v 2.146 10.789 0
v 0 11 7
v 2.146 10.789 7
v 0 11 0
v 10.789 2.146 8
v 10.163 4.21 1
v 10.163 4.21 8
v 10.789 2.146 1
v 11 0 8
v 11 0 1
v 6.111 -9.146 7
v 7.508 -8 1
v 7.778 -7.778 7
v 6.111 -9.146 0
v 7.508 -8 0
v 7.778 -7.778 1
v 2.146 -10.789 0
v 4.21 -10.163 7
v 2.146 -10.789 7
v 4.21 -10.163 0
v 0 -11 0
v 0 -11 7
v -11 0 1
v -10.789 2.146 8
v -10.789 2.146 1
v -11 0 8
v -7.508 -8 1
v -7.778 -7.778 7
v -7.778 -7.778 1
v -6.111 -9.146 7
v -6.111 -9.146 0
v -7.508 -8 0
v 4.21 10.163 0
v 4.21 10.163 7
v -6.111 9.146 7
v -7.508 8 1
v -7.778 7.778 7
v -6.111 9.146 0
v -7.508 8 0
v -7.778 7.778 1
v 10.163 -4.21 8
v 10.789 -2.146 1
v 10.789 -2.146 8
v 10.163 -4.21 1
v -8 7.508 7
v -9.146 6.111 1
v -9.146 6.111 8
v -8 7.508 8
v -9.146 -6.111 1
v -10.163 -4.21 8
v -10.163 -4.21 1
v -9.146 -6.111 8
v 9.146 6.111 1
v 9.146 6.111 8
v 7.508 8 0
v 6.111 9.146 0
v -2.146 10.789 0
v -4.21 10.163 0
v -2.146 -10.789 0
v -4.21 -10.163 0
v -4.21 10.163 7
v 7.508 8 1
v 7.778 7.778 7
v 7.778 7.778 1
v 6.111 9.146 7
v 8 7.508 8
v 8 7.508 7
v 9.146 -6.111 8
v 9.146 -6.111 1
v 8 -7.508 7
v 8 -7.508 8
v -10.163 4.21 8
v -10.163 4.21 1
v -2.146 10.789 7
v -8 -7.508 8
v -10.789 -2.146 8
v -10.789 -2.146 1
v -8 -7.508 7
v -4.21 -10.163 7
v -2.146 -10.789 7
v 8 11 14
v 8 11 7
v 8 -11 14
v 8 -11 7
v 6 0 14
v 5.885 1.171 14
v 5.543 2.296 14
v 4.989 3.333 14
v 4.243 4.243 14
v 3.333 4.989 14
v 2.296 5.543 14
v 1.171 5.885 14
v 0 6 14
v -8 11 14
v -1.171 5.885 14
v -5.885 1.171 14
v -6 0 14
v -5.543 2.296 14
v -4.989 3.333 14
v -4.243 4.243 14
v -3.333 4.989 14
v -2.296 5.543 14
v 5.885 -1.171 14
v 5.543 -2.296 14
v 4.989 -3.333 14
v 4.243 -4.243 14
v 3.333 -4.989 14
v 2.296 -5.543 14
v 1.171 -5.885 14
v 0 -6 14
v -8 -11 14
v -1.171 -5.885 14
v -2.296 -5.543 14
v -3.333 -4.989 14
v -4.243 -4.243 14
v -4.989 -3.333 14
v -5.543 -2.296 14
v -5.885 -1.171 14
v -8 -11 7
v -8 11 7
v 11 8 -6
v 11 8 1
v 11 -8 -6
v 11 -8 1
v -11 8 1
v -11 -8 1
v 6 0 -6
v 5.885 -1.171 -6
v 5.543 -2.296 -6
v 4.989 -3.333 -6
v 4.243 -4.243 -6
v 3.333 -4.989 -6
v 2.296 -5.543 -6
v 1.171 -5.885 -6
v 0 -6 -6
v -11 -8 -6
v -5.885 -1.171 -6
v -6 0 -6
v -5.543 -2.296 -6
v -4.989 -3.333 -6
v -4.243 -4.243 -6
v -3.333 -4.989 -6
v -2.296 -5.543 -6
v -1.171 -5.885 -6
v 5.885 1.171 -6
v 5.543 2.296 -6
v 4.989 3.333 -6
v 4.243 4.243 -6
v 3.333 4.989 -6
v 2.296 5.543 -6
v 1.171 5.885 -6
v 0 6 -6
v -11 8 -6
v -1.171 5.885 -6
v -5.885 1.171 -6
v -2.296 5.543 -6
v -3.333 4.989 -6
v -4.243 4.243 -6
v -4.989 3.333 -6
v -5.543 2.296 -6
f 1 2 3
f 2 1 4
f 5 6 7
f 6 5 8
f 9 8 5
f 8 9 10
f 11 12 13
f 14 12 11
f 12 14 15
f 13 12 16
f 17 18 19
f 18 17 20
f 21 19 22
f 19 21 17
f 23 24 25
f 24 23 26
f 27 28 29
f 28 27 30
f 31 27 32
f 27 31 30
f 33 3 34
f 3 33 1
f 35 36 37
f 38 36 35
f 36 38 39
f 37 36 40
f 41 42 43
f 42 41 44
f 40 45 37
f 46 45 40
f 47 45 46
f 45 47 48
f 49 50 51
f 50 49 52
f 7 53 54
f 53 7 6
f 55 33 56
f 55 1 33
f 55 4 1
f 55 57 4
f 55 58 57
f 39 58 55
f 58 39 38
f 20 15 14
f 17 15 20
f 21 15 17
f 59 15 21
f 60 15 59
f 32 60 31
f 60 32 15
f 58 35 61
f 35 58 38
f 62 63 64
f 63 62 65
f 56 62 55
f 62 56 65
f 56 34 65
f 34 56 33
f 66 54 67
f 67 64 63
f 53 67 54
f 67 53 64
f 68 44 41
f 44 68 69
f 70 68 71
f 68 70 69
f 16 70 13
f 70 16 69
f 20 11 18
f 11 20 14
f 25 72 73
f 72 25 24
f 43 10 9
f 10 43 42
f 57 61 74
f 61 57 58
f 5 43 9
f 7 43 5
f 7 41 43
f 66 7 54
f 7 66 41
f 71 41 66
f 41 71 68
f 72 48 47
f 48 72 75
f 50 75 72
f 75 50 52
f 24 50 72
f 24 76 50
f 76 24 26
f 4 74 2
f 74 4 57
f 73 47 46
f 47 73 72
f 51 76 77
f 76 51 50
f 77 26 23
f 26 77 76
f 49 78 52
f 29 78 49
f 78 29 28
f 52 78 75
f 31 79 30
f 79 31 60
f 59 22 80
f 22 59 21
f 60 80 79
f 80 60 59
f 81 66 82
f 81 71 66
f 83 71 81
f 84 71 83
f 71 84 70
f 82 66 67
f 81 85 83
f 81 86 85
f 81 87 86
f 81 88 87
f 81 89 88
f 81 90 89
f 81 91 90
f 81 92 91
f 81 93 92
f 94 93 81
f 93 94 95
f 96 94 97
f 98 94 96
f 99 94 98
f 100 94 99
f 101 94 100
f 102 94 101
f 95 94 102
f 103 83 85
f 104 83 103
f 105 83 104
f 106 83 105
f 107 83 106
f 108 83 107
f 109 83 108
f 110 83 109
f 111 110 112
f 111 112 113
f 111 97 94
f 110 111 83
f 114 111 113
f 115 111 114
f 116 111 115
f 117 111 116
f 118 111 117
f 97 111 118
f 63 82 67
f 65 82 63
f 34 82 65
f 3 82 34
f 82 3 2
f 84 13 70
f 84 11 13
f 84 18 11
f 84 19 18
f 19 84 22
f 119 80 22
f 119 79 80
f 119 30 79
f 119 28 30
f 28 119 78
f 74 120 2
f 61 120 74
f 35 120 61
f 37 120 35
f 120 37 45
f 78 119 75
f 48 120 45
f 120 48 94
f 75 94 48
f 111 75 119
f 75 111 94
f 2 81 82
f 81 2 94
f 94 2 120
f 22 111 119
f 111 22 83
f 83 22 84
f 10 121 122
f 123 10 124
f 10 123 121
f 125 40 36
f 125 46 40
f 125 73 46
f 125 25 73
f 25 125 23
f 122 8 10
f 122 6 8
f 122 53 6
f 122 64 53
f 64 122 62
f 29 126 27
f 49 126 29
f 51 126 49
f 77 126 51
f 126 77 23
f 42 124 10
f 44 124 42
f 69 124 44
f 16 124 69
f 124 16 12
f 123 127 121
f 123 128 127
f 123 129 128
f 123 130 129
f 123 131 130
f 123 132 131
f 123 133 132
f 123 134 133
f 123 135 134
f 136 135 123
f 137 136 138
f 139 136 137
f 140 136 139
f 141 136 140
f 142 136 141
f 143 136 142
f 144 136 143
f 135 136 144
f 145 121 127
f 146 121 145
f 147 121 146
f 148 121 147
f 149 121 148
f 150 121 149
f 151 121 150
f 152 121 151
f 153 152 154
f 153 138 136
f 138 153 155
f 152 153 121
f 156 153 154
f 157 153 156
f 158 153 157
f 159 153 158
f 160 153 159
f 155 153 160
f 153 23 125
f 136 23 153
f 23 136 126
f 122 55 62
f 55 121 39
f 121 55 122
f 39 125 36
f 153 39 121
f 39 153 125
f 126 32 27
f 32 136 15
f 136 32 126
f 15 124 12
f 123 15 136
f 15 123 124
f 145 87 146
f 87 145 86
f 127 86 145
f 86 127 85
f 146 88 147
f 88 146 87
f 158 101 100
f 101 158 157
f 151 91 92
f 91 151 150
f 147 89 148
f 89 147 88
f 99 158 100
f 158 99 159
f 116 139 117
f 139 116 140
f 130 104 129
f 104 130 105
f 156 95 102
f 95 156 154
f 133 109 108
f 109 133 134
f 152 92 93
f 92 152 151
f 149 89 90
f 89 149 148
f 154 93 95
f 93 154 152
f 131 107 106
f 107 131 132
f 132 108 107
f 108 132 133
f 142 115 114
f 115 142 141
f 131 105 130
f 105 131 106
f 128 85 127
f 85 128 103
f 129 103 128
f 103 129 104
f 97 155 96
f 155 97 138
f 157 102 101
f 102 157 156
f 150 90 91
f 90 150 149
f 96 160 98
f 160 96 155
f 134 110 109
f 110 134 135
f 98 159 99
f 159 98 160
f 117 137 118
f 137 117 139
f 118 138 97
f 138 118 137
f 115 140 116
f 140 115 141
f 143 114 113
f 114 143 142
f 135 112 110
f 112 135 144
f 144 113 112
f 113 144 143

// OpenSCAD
$fn = 32;

// ----------------------------------------------------------------------
// Oldham coupling disc: 22 x 20 mm
// ----------------------------------------------------------------------

// --- parameters (mm) ---
disc_d = 22;              // disc diameter
disc_t = 8;               // disc thickness
tongue_w = 16;            // tongue width
tongue_h = 6;             // tongue height
bore_d = 12;              // centre lightening bore

module disc() {
  cylinder(h = disc_t, d = disc_d);
  /* tongue on the top face, sunk 1 mm into the disc */
  translate([-tongue_w / 2, -disc_d / 2, disc_t - 1]) cube([tongue_w, disc_d, tongue_h + 1]);
  /* slot wall on the bottom face, 90 degrees turned */
  translate([-disc_d / 2, -tongue_w / 2, -tongue_h]) cube([disc_d, tongue_w, tongue_h + 1]);
}

difference() {
  disc();
  translate([0, 0, -tongue_h - 1]) cylinder(h = disc_t + 2 * tongue_h + 2, d = bore_d);
}
